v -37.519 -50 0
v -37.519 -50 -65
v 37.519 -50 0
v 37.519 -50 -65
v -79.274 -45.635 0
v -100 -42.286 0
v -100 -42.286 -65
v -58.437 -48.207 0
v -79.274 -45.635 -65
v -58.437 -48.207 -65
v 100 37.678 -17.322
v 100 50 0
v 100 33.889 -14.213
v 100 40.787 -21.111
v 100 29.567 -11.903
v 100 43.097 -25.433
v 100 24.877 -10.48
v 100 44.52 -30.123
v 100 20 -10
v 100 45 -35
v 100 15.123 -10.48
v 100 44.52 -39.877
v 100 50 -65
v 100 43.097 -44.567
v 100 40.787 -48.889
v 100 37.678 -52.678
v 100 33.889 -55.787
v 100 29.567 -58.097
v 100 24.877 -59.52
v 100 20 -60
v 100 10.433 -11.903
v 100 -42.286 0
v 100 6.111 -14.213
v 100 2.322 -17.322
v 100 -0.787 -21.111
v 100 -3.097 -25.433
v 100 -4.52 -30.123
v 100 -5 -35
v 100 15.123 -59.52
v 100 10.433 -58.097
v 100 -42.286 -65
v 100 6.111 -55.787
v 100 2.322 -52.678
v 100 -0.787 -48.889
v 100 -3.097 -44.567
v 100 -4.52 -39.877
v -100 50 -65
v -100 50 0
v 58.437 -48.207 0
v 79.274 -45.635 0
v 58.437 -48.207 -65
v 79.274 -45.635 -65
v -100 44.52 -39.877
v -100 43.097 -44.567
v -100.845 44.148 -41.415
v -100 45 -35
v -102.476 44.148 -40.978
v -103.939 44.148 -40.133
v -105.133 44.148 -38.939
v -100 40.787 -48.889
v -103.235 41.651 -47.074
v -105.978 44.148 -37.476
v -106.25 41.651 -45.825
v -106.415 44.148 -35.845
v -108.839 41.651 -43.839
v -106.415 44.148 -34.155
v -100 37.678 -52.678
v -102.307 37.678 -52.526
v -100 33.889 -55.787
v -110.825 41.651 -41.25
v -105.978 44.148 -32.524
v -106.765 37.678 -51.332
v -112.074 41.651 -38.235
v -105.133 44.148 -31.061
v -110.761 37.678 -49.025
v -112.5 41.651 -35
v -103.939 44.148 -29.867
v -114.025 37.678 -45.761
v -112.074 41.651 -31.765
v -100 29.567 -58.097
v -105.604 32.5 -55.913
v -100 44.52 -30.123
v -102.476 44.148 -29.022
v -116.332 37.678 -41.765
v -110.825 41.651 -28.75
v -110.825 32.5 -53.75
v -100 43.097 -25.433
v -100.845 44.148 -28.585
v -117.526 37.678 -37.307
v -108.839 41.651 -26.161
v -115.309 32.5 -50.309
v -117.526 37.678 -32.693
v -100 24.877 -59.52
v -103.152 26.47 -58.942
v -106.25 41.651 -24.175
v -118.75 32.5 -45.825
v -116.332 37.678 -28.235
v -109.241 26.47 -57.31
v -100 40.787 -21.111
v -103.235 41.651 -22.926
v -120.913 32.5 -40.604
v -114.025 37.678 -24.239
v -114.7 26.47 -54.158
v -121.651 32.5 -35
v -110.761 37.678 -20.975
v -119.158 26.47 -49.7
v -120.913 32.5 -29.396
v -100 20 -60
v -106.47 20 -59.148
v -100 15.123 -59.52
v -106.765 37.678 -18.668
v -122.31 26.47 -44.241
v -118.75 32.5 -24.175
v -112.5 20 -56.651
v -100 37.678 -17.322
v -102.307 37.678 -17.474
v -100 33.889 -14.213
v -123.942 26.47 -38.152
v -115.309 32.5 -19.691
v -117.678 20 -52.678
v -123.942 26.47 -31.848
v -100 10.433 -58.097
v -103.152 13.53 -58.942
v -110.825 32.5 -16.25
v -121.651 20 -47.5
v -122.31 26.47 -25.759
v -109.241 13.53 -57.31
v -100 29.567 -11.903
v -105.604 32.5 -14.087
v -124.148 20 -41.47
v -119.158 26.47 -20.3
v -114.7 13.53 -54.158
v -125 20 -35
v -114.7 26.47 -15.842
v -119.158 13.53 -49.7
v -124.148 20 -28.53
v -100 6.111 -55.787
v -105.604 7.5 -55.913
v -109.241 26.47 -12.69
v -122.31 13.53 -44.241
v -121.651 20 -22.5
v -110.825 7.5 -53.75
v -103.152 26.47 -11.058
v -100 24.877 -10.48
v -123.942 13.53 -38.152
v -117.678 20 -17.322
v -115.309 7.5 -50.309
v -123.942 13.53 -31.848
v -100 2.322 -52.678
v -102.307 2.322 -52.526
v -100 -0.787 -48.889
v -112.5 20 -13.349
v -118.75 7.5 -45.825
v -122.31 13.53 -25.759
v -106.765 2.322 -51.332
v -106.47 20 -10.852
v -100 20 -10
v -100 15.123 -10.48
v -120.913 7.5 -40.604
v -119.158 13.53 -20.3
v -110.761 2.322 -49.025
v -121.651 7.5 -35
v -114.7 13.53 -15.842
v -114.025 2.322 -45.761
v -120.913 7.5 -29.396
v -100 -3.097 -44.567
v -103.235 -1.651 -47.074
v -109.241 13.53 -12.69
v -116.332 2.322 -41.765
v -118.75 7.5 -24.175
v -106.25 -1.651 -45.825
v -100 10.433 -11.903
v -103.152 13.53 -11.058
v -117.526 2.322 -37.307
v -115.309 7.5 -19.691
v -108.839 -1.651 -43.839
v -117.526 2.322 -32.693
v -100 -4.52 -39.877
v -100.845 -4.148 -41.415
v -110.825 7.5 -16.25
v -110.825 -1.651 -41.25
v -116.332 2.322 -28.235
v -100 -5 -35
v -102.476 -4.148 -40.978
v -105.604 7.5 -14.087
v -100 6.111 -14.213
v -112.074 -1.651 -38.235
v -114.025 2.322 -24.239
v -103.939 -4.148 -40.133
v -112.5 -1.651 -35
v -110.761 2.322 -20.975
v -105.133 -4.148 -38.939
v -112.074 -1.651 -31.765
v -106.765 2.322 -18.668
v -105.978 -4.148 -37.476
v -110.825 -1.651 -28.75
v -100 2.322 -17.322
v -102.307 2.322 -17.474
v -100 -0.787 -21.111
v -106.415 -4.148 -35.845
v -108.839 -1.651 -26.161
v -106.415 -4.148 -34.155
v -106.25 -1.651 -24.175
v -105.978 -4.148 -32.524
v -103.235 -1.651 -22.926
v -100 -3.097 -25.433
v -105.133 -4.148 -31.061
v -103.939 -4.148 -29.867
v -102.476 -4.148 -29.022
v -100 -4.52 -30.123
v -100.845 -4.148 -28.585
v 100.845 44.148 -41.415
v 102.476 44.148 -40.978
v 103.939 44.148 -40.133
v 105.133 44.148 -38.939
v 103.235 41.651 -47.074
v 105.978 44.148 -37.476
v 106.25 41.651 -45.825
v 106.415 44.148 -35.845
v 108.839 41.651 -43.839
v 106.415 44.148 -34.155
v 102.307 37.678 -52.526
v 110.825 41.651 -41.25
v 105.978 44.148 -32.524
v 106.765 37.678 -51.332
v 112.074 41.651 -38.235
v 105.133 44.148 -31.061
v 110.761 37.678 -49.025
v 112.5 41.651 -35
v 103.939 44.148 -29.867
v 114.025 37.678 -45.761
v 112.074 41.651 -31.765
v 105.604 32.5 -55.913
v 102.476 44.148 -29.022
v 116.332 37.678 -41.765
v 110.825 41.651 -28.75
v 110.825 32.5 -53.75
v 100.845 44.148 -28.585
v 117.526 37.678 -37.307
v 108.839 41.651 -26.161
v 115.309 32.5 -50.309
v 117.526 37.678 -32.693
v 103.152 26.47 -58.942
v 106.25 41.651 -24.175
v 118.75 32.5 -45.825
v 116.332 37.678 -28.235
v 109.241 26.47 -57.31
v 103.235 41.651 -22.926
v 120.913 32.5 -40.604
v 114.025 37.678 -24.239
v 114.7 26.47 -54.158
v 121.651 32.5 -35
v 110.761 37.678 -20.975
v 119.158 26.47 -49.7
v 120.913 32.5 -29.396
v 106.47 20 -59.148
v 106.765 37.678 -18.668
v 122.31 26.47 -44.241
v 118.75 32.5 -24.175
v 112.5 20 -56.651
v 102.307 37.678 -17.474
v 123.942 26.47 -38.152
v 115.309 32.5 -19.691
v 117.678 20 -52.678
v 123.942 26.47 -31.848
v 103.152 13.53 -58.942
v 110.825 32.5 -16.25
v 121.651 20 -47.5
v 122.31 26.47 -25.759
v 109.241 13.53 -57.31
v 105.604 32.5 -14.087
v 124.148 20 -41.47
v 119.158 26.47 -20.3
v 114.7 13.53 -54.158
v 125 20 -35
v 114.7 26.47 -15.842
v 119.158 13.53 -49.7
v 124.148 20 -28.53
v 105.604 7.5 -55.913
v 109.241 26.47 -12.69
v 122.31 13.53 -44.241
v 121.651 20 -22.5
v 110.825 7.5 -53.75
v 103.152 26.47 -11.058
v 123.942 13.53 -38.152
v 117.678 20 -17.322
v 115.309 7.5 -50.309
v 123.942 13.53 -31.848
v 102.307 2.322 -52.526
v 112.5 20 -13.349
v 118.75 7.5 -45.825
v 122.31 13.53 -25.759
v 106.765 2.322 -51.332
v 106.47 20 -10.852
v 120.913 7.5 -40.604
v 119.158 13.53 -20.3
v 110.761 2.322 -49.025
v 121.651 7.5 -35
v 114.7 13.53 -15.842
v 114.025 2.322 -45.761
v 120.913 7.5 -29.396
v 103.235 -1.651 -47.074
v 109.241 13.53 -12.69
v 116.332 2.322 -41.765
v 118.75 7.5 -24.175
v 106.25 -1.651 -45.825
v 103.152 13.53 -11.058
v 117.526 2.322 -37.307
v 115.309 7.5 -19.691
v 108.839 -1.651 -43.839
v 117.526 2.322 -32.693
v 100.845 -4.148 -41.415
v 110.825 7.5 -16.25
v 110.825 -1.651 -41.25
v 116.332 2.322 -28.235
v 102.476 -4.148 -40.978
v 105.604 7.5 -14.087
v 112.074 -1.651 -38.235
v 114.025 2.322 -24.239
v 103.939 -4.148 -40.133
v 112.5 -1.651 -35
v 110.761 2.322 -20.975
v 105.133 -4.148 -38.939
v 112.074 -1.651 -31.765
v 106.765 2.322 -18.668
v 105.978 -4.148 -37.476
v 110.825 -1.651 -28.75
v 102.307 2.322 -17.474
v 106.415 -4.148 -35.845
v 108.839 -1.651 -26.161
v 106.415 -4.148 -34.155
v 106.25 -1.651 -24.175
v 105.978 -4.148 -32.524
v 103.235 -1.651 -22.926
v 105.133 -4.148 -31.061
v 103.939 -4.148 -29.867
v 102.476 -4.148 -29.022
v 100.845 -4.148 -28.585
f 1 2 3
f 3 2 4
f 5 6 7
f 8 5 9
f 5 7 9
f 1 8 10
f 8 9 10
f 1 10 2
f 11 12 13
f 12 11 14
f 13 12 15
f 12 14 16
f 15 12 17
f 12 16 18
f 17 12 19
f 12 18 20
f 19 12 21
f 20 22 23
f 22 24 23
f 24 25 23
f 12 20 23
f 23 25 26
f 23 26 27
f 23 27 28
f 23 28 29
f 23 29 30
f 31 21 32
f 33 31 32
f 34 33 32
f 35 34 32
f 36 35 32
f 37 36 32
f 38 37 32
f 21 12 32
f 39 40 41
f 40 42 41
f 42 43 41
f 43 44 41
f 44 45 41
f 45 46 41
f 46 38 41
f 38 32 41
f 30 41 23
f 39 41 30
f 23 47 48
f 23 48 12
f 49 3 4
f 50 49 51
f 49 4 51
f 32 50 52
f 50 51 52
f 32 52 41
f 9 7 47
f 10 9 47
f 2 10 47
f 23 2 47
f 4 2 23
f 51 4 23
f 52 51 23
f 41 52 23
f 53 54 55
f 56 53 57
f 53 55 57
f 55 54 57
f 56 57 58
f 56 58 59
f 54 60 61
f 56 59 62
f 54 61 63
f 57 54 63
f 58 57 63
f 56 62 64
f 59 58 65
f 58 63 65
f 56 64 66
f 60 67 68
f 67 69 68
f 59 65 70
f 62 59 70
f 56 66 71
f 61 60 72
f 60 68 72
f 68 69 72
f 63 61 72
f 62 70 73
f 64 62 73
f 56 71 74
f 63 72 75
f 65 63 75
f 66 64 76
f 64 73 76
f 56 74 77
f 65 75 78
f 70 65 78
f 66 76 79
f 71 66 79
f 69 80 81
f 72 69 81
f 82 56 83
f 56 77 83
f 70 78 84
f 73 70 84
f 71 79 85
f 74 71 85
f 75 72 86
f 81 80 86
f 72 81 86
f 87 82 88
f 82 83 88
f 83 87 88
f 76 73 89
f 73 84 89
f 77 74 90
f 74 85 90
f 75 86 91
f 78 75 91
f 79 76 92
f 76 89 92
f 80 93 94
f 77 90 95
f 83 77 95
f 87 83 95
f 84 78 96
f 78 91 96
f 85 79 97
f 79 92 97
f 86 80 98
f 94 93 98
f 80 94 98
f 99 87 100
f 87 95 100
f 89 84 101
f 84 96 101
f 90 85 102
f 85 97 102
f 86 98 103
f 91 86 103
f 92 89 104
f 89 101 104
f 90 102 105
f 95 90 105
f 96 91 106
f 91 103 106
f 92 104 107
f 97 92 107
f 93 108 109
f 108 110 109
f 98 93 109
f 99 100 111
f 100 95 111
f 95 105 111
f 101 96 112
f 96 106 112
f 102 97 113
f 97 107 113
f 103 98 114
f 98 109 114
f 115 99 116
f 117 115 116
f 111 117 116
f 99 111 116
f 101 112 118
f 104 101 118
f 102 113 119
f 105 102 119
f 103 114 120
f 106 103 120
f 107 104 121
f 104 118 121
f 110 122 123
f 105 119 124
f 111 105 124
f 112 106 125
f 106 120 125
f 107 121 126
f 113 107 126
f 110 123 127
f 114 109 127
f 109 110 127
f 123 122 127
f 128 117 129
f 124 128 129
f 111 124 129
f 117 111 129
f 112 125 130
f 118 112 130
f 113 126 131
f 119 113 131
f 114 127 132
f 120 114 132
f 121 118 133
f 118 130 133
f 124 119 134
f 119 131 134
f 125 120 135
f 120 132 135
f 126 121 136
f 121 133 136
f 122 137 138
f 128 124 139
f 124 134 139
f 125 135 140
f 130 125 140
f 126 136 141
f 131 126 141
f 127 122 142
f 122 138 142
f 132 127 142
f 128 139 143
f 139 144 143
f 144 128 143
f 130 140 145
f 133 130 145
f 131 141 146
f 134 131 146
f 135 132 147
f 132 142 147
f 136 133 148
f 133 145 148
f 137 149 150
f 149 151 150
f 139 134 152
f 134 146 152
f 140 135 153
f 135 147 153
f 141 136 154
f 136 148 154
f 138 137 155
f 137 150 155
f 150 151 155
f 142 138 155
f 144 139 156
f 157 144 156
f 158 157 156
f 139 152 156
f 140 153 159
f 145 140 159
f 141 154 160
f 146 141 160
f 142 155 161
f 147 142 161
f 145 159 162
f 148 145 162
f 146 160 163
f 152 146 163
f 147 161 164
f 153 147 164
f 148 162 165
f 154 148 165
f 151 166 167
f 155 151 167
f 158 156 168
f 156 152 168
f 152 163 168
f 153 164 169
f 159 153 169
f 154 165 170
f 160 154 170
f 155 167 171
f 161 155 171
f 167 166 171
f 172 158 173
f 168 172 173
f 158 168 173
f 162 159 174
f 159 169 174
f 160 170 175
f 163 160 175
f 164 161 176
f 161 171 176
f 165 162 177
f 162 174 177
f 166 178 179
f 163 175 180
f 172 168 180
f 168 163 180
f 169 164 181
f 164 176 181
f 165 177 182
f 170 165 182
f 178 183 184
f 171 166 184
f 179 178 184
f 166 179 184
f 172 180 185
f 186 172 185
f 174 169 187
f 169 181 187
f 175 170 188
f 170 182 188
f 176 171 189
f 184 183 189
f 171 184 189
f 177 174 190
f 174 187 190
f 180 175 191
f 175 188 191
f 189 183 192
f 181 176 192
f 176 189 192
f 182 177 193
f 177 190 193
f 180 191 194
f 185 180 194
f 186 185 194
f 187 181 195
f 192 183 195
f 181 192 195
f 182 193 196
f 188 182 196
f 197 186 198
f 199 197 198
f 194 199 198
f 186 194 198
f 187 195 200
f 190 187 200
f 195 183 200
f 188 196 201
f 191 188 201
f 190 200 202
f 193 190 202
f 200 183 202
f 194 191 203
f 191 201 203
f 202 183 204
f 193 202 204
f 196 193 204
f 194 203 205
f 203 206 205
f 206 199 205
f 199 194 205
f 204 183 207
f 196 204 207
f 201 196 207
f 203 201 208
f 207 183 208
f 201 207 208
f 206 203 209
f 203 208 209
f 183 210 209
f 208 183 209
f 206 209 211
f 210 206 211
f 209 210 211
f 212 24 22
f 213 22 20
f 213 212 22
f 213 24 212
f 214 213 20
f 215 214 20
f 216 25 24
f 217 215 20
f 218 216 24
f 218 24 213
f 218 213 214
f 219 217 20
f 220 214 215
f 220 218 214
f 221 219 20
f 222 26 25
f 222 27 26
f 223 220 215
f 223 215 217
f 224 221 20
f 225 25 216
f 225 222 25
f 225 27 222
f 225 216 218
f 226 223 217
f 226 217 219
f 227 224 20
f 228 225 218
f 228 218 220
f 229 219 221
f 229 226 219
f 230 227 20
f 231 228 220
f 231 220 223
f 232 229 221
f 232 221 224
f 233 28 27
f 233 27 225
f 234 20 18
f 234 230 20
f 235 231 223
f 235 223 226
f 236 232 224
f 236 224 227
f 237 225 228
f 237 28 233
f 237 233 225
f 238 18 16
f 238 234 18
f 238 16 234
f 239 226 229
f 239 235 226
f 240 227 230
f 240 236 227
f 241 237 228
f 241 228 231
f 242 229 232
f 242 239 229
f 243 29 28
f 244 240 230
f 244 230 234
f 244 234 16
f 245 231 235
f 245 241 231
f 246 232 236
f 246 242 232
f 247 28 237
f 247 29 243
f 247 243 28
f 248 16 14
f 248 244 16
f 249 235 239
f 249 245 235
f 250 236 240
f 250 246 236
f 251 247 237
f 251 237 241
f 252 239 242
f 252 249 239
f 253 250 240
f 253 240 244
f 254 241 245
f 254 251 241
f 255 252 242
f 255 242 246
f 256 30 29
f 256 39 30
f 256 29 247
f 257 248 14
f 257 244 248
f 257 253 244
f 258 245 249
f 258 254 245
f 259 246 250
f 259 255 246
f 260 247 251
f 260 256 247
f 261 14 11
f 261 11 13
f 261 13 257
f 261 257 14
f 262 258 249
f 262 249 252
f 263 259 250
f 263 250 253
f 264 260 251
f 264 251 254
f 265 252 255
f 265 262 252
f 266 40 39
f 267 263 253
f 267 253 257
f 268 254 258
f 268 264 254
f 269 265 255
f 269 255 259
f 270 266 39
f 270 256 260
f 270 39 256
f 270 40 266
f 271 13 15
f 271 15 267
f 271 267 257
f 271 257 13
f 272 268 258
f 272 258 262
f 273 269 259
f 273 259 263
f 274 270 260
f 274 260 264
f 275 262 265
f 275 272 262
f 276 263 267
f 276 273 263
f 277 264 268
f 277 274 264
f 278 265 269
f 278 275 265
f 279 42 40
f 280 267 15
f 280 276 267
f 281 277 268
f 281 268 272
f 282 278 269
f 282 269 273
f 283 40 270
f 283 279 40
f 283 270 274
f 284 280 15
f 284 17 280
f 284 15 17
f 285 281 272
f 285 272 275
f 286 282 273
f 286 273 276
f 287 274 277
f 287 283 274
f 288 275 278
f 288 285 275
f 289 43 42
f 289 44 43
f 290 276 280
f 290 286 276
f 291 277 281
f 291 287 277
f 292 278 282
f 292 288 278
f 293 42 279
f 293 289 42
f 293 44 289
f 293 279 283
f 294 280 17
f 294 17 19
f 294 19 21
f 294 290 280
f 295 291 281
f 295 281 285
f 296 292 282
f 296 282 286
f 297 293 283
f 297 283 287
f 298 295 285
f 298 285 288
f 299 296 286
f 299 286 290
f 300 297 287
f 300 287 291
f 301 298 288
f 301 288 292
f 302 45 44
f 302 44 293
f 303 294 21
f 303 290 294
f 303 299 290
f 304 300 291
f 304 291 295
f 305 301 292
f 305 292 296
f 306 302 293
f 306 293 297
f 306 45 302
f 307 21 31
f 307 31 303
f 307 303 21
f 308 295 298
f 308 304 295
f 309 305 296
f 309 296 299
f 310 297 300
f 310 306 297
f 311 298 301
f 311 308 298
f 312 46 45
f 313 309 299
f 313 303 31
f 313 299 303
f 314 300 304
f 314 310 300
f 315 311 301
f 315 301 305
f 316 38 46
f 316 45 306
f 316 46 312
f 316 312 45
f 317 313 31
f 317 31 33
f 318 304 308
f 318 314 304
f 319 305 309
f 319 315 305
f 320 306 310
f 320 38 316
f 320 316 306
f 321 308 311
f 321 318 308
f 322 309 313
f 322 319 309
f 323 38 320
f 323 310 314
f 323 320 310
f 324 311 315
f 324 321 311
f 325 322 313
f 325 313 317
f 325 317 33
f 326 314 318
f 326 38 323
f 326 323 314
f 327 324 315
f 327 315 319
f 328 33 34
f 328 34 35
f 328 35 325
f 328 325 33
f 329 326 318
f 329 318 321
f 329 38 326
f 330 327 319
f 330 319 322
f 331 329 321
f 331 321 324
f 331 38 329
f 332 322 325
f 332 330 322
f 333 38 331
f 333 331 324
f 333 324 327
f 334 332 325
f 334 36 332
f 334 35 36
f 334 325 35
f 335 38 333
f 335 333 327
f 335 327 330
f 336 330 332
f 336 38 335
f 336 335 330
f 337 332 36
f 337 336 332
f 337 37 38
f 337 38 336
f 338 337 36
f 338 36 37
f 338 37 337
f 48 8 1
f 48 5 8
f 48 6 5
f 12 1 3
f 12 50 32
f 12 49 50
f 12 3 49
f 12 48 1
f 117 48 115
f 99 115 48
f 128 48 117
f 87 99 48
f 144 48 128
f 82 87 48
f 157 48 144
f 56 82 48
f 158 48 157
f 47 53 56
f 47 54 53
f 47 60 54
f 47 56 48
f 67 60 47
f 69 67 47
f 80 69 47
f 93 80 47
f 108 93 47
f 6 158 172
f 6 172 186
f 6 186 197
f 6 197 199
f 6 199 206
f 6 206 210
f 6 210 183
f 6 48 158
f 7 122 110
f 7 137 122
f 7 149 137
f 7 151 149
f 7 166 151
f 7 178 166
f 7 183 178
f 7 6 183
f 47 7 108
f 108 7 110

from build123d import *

# Parameters (mm, degrees)
BOSS_EXTRUDE1_DEPTH      = 50
BOSS_EXTRUDE1_DEPTH_BACK = 50
SKETCH2_W                = 200
SKETCH2_H                = 130
SKETCH4_R                = 5
BOSS_EXTRUDE2_DEPTH      = 20
CUT_EXTRUDE1_DEPTH       = 142
SKETCH8_W                = 200.147061324
SKETCH8_H                = 101.72915409
CUT_EXTRUDE2_DEPTH       = 142


with BuildPart() as part:
    # Sketch2 → Boss-Extrude1 (new, two sides: drawn at the far end of the back side and taken through both)
    with BuildSketch(Plane(origin=(0, 0, 0), x_dir=(1, 0, 0), z_dir=(0, 1, 0)).offset(-BOSS_EXTRUDE1_DEPTH_BACK)):
        Rectangle(SKETCH2_W, SKETCH2_H)
    extrude(amount=BOSS_EXTRUDE1_DEPTH + BOSS_EXTRUDE1_DEPTH_BACK)

    # Sketch4 → Boss-Extrude2 (add)
    with BuildSketch(Plane.XY.offset(65)):
        Circle(SKETCH4_R)
    extrude(amount=BOSS_EXTRUDE2_DEPTH)

    # Sketch6 → Revolve1 (revolve)
    with BuildSketch(Plane.ZY.offset(100)):
        with BuildLine():
            Line((-35, -5), (-35, 45))
            ThreePointArc((-35, 45), (-10, 20), (-35, -5))
        make_face()
    revolve1 = revolve(axis=Axis((-100, -5, -35), (0, 1, 0)))

    # Mirror1: Revolve1 across plane
    add(revolve1.mirror(Plane(origin=(0, 0, 0), x_dir=(0, 0, 1), z_dir=(1, 0, 0))))

    # Sketch7 → Cut-Extrude1 (cut)
    with BuildSketch(Plane(origin=(0, 0, -65), x_dir=(-1, 0, 0), z_dir=(0, 0, -1))):
        with BuildLine():
            ThreePointArc((-37.519288456, -50), (-68.867740428, -47.018454326), (-100, -42.285857823))
            Line((-100, -42.285857823), (-100, -50))
            Line((-100, -50), (-37.519288456, -50))
        make_face()
        with BuildLine():
            Line((100, -50), (100, -42.285857823))
            ThreePointArc((100, -42.285857823), (68.867740428, -47.018454326), (37.519288456, -50))
            Line((37.519288456, -50), (100, -50))
        make_face()
    extrude(amount=-CUT_EXTRUDE1_DEPTH, mode=Mode.SUBTRACT)

    # Sketch8 → Cut-Extrude2 (cut)
    with BuildSketch(Plane(origin=(0, 50, 0), x_dir=(1, 0, 0), z_dir=(0, 1, 0))):
        with Locations((0.073530662, -50.864577045)):
            Rectangle(SKETCH8_W, SKETCH8_H)
    extrude(amount=-CUT_EXTRUDE2_DEPTH, mode=Mode.SUBTRACT)


solid = part.part
